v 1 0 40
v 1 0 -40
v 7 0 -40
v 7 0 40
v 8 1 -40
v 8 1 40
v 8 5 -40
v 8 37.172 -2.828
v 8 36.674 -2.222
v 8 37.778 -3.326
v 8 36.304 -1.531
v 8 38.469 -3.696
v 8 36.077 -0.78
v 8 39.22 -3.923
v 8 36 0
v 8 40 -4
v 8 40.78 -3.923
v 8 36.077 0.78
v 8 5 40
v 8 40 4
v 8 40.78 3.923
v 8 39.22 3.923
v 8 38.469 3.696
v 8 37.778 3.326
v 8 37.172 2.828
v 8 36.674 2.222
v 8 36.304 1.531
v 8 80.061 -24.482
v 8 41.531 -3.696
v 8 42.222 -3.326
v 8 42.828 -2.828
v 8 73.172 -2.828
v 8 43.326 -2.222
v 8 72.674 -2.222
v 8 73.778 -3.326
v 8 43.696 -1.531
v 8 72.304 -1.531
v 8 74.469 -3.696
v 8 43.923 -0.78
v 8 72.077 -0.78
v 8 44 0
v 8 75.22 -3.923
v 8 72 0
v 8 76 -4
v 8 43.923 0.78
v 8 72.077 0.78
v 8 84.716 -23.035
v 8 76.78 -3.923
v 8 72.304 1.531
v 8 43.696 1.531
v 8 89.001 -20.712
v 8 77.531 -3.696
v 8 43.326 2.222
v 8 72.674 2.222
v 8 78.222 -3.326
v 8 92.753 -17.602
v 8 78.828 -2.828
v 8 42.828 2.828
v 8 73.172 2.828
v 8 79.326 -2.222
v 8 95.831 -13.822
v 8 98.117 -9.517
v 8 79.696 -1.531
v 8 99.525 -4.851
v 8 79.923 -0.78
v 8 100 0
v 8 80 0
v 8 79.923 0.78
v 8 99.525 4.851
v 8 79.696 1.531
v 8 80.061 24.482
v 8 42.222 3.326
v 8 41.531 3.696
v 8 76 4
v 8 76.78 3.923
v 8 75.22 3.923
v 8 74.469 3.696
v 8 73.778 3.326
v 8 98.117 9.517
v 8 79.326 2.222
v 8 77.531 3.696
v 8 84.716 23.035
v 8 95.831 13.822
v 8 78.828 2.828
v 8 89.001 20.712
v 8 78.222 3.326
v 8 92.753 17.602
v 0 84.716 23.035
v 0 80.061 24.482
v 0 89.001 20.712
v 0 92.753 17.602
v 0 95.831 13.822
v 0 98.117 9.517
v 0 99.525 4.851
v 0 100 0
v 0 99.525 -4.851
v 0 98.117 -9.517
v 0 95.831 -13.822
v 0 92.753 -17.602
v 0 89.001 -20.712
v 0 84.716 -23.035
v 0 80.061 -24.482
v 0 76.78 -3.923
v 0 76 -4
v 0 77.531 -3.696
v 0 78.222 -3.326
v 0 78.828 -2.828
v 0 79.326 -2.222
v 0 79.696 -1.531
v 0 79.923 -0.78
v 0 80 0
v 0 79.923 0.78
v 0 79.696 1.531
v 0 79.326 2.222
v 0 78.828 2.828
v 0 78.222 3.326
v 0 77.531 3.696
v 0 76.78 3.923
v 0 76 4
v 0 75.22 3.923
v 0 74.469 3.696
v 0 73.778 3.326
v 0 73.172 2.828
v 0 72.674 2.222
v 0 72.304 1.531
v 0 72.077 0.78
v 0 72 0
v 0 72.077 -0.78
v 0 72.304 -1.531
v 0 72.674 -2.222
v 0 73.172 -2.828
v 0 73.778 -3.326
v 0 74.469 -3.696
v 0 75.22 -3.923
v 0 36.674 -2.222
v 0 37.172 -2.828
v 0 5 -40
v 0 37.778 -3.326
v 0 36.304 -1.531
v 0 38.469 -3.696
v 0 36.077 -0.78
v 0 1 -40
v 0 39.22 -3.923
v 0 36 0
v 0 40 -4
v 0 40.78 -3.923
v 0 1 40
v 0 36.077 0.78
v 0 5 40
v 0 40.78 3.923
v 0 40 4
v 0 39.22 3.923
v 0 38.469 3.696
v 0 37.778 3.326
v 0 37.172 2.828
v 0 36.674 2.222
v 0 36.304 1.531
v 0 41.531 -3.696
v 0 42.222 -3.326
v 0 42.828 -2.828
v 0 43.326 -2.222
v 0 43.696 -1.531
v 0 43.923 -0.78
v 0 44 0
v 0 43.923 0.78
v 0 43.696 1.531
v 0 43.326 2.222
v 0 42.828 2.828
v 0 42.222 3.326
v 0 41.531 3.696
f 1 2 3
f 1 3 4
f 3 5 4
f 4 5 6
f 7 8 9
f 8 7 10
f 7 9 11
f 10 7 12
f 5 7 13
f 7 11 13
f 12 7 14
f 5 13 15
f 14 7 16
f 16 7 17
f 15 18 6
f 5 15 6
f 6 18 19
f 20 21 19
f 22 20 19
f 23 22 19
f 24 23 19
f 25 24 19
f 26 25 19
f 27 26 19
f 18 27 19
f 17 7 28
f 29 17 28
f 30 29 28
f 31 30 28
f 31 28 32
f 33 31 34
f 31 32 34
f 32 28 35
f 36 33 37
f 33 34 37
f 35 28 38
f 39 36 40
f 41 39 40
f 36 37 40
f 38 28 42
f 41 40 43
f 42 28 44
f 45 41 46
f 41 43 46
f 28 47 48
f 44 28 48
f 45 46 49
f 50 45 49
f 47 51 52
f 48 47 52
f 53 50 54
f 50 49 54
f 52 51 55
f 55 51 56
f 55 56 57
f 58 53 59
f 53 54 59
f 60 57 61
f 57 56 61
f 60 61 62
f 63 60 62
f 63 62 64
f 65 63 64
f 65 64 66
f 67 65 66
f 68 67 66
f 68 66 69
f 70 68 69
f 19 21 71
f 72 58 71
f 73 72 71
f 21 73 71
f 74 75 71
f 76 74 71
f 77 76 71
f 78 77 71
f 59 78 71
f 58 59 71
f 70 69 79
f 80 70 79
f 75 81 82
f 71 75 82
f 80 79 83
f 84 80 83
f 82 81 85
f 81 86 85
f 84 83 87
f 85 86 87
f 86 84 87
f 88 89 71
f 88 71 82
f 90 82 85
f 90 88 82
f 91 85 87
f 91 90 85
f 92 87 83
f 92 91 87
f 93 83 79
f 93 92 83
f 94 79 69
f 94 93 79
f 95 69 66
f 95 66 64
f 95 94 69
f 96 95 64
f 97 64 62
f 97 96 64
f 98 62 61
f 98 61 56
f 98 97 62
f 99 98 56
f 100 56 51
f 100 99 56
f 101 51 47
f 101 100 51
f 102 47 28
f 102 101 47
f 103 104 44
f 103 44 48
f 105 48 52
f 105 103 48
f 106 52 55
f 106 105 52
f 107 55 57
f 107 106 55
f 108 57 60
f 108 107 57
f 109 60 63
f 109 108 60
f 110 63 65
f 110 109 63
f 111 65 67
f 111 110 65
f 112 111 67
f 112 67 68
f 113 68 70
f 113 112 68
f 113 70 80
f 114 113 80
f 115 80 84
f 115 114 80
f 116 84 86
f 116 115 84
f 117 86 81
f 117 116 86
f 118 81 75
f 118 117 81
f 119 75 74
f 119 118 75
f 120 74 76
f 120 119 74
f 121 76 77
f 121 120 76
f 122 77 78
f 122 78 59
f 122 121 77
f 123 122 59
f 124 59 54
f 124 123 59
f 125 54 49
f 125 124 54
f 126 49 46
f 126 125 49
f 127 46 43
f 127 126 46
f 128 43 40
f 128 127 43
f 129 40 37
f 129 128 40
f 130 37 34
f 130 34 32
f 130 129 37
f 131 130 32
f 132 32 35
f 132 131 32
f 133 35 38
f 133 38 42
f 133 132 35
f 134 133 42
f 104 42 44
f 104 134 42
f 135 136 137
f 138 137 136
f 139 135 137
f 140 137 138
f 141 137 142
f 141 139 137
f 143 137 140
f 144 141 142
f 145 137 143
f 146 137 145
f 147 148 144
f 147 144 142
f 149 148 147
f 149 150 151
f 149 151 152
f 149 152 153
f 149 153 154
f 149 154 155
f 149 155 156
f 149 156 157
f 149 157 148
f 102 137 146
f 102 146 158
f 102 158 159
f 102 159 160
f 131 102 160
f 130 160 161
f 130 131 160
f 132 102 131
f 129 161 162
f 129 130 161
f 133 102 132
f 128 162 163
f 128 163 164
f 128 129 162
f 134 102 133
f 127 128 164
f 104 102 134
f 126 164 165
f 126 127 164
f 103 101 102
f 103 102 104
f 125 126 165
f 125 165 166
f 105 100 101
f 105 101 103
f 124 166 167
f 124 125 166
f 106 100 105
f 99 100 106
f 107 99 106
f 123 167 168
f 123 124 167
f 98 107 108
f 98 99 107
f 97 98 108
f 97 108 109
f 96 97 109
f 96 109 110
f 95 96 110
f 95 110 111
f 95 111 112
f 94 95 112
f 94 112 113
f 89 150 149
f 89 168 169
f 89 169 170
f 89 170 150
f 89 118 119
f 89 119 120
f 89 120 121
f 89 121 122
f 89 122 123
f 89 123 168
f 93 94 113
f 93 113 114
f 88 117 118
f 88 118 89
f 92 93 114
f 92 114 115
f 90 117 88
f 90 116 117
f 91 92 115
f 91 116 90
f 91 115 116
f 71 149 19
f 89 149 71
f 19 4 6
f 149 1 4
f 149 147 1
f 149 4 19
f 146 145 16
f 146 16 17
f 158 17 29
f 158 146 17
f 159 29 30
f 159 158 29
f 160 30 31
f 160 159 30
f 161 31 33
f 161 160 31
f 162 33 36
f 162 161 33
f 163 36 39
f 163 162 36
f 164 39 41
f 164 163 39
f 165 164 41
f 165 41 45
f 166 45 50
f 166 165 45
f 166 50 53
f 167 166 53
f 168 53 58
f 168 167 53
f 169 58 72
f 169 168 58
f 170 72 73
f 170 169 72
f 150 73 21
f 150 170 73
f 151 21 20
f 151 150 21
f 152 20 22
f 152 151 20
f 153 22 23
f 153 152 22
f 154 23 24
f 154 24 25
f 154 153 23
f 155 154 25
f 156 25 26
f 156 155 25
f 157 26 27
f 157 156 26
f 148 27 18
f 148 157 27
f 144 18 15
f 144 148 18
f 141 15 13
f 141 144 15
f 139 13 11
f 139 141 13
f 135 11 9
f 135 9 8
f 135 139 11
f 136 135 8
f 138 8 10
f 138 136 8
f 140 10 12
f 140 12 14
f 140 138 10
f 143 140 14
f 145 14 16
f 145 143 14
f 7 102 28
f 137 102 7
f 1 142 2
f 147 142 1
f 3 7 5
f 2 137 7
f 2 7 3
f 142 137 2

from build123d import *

# Parameters (mm, degrees)
SKETCH1_R           = 4
BOSS_EXTRUDE1_DEPTH = 8
CHAMFER1_SIZE       = 1


with BuildPart() as part:
    # Sketch1 → Boss-Extrude1 (new body)
    with BuildSketch(Plane(origin=(0, 0, 0), x_dir=(0, 0, -1), z_dir=(1, 0, 0))):
        with BuildLine():
            Line((40, 0), (-40, 0))
            Line((-40, 0), (-40, 5))
            Line((-40, 5), (-24.482301542, 80.061315167))
            ThreePointArc((-24.482301542, 80.061315167), (0, 100), (24.482301542, 80.061315167))
            Line((24.482301542, 80.061315167), (40, 5))
            Line((40, 5), (40, 0))
        make_face()
        with Locations((0, 40)):
            Circle(SKETCH1_R, mode=Mode.SUBTRACT)
        with Locations((0, 76)):
            Circle(SKETCH1_R, mode=Mode.SUBTRACT)
    extrude(amount=BOSS_EXTRUDE1_DEPTH)

    # Chamfer1
    chamfer1_edges = [part.edges().sort_by_distance(p)[0] for p in [
        (8, 0, 0),
        (0, 0, 0),
    ]]
    chamfer(chamfer1_edges, length=CHAMFER1_SIZE)


solid = part.part
